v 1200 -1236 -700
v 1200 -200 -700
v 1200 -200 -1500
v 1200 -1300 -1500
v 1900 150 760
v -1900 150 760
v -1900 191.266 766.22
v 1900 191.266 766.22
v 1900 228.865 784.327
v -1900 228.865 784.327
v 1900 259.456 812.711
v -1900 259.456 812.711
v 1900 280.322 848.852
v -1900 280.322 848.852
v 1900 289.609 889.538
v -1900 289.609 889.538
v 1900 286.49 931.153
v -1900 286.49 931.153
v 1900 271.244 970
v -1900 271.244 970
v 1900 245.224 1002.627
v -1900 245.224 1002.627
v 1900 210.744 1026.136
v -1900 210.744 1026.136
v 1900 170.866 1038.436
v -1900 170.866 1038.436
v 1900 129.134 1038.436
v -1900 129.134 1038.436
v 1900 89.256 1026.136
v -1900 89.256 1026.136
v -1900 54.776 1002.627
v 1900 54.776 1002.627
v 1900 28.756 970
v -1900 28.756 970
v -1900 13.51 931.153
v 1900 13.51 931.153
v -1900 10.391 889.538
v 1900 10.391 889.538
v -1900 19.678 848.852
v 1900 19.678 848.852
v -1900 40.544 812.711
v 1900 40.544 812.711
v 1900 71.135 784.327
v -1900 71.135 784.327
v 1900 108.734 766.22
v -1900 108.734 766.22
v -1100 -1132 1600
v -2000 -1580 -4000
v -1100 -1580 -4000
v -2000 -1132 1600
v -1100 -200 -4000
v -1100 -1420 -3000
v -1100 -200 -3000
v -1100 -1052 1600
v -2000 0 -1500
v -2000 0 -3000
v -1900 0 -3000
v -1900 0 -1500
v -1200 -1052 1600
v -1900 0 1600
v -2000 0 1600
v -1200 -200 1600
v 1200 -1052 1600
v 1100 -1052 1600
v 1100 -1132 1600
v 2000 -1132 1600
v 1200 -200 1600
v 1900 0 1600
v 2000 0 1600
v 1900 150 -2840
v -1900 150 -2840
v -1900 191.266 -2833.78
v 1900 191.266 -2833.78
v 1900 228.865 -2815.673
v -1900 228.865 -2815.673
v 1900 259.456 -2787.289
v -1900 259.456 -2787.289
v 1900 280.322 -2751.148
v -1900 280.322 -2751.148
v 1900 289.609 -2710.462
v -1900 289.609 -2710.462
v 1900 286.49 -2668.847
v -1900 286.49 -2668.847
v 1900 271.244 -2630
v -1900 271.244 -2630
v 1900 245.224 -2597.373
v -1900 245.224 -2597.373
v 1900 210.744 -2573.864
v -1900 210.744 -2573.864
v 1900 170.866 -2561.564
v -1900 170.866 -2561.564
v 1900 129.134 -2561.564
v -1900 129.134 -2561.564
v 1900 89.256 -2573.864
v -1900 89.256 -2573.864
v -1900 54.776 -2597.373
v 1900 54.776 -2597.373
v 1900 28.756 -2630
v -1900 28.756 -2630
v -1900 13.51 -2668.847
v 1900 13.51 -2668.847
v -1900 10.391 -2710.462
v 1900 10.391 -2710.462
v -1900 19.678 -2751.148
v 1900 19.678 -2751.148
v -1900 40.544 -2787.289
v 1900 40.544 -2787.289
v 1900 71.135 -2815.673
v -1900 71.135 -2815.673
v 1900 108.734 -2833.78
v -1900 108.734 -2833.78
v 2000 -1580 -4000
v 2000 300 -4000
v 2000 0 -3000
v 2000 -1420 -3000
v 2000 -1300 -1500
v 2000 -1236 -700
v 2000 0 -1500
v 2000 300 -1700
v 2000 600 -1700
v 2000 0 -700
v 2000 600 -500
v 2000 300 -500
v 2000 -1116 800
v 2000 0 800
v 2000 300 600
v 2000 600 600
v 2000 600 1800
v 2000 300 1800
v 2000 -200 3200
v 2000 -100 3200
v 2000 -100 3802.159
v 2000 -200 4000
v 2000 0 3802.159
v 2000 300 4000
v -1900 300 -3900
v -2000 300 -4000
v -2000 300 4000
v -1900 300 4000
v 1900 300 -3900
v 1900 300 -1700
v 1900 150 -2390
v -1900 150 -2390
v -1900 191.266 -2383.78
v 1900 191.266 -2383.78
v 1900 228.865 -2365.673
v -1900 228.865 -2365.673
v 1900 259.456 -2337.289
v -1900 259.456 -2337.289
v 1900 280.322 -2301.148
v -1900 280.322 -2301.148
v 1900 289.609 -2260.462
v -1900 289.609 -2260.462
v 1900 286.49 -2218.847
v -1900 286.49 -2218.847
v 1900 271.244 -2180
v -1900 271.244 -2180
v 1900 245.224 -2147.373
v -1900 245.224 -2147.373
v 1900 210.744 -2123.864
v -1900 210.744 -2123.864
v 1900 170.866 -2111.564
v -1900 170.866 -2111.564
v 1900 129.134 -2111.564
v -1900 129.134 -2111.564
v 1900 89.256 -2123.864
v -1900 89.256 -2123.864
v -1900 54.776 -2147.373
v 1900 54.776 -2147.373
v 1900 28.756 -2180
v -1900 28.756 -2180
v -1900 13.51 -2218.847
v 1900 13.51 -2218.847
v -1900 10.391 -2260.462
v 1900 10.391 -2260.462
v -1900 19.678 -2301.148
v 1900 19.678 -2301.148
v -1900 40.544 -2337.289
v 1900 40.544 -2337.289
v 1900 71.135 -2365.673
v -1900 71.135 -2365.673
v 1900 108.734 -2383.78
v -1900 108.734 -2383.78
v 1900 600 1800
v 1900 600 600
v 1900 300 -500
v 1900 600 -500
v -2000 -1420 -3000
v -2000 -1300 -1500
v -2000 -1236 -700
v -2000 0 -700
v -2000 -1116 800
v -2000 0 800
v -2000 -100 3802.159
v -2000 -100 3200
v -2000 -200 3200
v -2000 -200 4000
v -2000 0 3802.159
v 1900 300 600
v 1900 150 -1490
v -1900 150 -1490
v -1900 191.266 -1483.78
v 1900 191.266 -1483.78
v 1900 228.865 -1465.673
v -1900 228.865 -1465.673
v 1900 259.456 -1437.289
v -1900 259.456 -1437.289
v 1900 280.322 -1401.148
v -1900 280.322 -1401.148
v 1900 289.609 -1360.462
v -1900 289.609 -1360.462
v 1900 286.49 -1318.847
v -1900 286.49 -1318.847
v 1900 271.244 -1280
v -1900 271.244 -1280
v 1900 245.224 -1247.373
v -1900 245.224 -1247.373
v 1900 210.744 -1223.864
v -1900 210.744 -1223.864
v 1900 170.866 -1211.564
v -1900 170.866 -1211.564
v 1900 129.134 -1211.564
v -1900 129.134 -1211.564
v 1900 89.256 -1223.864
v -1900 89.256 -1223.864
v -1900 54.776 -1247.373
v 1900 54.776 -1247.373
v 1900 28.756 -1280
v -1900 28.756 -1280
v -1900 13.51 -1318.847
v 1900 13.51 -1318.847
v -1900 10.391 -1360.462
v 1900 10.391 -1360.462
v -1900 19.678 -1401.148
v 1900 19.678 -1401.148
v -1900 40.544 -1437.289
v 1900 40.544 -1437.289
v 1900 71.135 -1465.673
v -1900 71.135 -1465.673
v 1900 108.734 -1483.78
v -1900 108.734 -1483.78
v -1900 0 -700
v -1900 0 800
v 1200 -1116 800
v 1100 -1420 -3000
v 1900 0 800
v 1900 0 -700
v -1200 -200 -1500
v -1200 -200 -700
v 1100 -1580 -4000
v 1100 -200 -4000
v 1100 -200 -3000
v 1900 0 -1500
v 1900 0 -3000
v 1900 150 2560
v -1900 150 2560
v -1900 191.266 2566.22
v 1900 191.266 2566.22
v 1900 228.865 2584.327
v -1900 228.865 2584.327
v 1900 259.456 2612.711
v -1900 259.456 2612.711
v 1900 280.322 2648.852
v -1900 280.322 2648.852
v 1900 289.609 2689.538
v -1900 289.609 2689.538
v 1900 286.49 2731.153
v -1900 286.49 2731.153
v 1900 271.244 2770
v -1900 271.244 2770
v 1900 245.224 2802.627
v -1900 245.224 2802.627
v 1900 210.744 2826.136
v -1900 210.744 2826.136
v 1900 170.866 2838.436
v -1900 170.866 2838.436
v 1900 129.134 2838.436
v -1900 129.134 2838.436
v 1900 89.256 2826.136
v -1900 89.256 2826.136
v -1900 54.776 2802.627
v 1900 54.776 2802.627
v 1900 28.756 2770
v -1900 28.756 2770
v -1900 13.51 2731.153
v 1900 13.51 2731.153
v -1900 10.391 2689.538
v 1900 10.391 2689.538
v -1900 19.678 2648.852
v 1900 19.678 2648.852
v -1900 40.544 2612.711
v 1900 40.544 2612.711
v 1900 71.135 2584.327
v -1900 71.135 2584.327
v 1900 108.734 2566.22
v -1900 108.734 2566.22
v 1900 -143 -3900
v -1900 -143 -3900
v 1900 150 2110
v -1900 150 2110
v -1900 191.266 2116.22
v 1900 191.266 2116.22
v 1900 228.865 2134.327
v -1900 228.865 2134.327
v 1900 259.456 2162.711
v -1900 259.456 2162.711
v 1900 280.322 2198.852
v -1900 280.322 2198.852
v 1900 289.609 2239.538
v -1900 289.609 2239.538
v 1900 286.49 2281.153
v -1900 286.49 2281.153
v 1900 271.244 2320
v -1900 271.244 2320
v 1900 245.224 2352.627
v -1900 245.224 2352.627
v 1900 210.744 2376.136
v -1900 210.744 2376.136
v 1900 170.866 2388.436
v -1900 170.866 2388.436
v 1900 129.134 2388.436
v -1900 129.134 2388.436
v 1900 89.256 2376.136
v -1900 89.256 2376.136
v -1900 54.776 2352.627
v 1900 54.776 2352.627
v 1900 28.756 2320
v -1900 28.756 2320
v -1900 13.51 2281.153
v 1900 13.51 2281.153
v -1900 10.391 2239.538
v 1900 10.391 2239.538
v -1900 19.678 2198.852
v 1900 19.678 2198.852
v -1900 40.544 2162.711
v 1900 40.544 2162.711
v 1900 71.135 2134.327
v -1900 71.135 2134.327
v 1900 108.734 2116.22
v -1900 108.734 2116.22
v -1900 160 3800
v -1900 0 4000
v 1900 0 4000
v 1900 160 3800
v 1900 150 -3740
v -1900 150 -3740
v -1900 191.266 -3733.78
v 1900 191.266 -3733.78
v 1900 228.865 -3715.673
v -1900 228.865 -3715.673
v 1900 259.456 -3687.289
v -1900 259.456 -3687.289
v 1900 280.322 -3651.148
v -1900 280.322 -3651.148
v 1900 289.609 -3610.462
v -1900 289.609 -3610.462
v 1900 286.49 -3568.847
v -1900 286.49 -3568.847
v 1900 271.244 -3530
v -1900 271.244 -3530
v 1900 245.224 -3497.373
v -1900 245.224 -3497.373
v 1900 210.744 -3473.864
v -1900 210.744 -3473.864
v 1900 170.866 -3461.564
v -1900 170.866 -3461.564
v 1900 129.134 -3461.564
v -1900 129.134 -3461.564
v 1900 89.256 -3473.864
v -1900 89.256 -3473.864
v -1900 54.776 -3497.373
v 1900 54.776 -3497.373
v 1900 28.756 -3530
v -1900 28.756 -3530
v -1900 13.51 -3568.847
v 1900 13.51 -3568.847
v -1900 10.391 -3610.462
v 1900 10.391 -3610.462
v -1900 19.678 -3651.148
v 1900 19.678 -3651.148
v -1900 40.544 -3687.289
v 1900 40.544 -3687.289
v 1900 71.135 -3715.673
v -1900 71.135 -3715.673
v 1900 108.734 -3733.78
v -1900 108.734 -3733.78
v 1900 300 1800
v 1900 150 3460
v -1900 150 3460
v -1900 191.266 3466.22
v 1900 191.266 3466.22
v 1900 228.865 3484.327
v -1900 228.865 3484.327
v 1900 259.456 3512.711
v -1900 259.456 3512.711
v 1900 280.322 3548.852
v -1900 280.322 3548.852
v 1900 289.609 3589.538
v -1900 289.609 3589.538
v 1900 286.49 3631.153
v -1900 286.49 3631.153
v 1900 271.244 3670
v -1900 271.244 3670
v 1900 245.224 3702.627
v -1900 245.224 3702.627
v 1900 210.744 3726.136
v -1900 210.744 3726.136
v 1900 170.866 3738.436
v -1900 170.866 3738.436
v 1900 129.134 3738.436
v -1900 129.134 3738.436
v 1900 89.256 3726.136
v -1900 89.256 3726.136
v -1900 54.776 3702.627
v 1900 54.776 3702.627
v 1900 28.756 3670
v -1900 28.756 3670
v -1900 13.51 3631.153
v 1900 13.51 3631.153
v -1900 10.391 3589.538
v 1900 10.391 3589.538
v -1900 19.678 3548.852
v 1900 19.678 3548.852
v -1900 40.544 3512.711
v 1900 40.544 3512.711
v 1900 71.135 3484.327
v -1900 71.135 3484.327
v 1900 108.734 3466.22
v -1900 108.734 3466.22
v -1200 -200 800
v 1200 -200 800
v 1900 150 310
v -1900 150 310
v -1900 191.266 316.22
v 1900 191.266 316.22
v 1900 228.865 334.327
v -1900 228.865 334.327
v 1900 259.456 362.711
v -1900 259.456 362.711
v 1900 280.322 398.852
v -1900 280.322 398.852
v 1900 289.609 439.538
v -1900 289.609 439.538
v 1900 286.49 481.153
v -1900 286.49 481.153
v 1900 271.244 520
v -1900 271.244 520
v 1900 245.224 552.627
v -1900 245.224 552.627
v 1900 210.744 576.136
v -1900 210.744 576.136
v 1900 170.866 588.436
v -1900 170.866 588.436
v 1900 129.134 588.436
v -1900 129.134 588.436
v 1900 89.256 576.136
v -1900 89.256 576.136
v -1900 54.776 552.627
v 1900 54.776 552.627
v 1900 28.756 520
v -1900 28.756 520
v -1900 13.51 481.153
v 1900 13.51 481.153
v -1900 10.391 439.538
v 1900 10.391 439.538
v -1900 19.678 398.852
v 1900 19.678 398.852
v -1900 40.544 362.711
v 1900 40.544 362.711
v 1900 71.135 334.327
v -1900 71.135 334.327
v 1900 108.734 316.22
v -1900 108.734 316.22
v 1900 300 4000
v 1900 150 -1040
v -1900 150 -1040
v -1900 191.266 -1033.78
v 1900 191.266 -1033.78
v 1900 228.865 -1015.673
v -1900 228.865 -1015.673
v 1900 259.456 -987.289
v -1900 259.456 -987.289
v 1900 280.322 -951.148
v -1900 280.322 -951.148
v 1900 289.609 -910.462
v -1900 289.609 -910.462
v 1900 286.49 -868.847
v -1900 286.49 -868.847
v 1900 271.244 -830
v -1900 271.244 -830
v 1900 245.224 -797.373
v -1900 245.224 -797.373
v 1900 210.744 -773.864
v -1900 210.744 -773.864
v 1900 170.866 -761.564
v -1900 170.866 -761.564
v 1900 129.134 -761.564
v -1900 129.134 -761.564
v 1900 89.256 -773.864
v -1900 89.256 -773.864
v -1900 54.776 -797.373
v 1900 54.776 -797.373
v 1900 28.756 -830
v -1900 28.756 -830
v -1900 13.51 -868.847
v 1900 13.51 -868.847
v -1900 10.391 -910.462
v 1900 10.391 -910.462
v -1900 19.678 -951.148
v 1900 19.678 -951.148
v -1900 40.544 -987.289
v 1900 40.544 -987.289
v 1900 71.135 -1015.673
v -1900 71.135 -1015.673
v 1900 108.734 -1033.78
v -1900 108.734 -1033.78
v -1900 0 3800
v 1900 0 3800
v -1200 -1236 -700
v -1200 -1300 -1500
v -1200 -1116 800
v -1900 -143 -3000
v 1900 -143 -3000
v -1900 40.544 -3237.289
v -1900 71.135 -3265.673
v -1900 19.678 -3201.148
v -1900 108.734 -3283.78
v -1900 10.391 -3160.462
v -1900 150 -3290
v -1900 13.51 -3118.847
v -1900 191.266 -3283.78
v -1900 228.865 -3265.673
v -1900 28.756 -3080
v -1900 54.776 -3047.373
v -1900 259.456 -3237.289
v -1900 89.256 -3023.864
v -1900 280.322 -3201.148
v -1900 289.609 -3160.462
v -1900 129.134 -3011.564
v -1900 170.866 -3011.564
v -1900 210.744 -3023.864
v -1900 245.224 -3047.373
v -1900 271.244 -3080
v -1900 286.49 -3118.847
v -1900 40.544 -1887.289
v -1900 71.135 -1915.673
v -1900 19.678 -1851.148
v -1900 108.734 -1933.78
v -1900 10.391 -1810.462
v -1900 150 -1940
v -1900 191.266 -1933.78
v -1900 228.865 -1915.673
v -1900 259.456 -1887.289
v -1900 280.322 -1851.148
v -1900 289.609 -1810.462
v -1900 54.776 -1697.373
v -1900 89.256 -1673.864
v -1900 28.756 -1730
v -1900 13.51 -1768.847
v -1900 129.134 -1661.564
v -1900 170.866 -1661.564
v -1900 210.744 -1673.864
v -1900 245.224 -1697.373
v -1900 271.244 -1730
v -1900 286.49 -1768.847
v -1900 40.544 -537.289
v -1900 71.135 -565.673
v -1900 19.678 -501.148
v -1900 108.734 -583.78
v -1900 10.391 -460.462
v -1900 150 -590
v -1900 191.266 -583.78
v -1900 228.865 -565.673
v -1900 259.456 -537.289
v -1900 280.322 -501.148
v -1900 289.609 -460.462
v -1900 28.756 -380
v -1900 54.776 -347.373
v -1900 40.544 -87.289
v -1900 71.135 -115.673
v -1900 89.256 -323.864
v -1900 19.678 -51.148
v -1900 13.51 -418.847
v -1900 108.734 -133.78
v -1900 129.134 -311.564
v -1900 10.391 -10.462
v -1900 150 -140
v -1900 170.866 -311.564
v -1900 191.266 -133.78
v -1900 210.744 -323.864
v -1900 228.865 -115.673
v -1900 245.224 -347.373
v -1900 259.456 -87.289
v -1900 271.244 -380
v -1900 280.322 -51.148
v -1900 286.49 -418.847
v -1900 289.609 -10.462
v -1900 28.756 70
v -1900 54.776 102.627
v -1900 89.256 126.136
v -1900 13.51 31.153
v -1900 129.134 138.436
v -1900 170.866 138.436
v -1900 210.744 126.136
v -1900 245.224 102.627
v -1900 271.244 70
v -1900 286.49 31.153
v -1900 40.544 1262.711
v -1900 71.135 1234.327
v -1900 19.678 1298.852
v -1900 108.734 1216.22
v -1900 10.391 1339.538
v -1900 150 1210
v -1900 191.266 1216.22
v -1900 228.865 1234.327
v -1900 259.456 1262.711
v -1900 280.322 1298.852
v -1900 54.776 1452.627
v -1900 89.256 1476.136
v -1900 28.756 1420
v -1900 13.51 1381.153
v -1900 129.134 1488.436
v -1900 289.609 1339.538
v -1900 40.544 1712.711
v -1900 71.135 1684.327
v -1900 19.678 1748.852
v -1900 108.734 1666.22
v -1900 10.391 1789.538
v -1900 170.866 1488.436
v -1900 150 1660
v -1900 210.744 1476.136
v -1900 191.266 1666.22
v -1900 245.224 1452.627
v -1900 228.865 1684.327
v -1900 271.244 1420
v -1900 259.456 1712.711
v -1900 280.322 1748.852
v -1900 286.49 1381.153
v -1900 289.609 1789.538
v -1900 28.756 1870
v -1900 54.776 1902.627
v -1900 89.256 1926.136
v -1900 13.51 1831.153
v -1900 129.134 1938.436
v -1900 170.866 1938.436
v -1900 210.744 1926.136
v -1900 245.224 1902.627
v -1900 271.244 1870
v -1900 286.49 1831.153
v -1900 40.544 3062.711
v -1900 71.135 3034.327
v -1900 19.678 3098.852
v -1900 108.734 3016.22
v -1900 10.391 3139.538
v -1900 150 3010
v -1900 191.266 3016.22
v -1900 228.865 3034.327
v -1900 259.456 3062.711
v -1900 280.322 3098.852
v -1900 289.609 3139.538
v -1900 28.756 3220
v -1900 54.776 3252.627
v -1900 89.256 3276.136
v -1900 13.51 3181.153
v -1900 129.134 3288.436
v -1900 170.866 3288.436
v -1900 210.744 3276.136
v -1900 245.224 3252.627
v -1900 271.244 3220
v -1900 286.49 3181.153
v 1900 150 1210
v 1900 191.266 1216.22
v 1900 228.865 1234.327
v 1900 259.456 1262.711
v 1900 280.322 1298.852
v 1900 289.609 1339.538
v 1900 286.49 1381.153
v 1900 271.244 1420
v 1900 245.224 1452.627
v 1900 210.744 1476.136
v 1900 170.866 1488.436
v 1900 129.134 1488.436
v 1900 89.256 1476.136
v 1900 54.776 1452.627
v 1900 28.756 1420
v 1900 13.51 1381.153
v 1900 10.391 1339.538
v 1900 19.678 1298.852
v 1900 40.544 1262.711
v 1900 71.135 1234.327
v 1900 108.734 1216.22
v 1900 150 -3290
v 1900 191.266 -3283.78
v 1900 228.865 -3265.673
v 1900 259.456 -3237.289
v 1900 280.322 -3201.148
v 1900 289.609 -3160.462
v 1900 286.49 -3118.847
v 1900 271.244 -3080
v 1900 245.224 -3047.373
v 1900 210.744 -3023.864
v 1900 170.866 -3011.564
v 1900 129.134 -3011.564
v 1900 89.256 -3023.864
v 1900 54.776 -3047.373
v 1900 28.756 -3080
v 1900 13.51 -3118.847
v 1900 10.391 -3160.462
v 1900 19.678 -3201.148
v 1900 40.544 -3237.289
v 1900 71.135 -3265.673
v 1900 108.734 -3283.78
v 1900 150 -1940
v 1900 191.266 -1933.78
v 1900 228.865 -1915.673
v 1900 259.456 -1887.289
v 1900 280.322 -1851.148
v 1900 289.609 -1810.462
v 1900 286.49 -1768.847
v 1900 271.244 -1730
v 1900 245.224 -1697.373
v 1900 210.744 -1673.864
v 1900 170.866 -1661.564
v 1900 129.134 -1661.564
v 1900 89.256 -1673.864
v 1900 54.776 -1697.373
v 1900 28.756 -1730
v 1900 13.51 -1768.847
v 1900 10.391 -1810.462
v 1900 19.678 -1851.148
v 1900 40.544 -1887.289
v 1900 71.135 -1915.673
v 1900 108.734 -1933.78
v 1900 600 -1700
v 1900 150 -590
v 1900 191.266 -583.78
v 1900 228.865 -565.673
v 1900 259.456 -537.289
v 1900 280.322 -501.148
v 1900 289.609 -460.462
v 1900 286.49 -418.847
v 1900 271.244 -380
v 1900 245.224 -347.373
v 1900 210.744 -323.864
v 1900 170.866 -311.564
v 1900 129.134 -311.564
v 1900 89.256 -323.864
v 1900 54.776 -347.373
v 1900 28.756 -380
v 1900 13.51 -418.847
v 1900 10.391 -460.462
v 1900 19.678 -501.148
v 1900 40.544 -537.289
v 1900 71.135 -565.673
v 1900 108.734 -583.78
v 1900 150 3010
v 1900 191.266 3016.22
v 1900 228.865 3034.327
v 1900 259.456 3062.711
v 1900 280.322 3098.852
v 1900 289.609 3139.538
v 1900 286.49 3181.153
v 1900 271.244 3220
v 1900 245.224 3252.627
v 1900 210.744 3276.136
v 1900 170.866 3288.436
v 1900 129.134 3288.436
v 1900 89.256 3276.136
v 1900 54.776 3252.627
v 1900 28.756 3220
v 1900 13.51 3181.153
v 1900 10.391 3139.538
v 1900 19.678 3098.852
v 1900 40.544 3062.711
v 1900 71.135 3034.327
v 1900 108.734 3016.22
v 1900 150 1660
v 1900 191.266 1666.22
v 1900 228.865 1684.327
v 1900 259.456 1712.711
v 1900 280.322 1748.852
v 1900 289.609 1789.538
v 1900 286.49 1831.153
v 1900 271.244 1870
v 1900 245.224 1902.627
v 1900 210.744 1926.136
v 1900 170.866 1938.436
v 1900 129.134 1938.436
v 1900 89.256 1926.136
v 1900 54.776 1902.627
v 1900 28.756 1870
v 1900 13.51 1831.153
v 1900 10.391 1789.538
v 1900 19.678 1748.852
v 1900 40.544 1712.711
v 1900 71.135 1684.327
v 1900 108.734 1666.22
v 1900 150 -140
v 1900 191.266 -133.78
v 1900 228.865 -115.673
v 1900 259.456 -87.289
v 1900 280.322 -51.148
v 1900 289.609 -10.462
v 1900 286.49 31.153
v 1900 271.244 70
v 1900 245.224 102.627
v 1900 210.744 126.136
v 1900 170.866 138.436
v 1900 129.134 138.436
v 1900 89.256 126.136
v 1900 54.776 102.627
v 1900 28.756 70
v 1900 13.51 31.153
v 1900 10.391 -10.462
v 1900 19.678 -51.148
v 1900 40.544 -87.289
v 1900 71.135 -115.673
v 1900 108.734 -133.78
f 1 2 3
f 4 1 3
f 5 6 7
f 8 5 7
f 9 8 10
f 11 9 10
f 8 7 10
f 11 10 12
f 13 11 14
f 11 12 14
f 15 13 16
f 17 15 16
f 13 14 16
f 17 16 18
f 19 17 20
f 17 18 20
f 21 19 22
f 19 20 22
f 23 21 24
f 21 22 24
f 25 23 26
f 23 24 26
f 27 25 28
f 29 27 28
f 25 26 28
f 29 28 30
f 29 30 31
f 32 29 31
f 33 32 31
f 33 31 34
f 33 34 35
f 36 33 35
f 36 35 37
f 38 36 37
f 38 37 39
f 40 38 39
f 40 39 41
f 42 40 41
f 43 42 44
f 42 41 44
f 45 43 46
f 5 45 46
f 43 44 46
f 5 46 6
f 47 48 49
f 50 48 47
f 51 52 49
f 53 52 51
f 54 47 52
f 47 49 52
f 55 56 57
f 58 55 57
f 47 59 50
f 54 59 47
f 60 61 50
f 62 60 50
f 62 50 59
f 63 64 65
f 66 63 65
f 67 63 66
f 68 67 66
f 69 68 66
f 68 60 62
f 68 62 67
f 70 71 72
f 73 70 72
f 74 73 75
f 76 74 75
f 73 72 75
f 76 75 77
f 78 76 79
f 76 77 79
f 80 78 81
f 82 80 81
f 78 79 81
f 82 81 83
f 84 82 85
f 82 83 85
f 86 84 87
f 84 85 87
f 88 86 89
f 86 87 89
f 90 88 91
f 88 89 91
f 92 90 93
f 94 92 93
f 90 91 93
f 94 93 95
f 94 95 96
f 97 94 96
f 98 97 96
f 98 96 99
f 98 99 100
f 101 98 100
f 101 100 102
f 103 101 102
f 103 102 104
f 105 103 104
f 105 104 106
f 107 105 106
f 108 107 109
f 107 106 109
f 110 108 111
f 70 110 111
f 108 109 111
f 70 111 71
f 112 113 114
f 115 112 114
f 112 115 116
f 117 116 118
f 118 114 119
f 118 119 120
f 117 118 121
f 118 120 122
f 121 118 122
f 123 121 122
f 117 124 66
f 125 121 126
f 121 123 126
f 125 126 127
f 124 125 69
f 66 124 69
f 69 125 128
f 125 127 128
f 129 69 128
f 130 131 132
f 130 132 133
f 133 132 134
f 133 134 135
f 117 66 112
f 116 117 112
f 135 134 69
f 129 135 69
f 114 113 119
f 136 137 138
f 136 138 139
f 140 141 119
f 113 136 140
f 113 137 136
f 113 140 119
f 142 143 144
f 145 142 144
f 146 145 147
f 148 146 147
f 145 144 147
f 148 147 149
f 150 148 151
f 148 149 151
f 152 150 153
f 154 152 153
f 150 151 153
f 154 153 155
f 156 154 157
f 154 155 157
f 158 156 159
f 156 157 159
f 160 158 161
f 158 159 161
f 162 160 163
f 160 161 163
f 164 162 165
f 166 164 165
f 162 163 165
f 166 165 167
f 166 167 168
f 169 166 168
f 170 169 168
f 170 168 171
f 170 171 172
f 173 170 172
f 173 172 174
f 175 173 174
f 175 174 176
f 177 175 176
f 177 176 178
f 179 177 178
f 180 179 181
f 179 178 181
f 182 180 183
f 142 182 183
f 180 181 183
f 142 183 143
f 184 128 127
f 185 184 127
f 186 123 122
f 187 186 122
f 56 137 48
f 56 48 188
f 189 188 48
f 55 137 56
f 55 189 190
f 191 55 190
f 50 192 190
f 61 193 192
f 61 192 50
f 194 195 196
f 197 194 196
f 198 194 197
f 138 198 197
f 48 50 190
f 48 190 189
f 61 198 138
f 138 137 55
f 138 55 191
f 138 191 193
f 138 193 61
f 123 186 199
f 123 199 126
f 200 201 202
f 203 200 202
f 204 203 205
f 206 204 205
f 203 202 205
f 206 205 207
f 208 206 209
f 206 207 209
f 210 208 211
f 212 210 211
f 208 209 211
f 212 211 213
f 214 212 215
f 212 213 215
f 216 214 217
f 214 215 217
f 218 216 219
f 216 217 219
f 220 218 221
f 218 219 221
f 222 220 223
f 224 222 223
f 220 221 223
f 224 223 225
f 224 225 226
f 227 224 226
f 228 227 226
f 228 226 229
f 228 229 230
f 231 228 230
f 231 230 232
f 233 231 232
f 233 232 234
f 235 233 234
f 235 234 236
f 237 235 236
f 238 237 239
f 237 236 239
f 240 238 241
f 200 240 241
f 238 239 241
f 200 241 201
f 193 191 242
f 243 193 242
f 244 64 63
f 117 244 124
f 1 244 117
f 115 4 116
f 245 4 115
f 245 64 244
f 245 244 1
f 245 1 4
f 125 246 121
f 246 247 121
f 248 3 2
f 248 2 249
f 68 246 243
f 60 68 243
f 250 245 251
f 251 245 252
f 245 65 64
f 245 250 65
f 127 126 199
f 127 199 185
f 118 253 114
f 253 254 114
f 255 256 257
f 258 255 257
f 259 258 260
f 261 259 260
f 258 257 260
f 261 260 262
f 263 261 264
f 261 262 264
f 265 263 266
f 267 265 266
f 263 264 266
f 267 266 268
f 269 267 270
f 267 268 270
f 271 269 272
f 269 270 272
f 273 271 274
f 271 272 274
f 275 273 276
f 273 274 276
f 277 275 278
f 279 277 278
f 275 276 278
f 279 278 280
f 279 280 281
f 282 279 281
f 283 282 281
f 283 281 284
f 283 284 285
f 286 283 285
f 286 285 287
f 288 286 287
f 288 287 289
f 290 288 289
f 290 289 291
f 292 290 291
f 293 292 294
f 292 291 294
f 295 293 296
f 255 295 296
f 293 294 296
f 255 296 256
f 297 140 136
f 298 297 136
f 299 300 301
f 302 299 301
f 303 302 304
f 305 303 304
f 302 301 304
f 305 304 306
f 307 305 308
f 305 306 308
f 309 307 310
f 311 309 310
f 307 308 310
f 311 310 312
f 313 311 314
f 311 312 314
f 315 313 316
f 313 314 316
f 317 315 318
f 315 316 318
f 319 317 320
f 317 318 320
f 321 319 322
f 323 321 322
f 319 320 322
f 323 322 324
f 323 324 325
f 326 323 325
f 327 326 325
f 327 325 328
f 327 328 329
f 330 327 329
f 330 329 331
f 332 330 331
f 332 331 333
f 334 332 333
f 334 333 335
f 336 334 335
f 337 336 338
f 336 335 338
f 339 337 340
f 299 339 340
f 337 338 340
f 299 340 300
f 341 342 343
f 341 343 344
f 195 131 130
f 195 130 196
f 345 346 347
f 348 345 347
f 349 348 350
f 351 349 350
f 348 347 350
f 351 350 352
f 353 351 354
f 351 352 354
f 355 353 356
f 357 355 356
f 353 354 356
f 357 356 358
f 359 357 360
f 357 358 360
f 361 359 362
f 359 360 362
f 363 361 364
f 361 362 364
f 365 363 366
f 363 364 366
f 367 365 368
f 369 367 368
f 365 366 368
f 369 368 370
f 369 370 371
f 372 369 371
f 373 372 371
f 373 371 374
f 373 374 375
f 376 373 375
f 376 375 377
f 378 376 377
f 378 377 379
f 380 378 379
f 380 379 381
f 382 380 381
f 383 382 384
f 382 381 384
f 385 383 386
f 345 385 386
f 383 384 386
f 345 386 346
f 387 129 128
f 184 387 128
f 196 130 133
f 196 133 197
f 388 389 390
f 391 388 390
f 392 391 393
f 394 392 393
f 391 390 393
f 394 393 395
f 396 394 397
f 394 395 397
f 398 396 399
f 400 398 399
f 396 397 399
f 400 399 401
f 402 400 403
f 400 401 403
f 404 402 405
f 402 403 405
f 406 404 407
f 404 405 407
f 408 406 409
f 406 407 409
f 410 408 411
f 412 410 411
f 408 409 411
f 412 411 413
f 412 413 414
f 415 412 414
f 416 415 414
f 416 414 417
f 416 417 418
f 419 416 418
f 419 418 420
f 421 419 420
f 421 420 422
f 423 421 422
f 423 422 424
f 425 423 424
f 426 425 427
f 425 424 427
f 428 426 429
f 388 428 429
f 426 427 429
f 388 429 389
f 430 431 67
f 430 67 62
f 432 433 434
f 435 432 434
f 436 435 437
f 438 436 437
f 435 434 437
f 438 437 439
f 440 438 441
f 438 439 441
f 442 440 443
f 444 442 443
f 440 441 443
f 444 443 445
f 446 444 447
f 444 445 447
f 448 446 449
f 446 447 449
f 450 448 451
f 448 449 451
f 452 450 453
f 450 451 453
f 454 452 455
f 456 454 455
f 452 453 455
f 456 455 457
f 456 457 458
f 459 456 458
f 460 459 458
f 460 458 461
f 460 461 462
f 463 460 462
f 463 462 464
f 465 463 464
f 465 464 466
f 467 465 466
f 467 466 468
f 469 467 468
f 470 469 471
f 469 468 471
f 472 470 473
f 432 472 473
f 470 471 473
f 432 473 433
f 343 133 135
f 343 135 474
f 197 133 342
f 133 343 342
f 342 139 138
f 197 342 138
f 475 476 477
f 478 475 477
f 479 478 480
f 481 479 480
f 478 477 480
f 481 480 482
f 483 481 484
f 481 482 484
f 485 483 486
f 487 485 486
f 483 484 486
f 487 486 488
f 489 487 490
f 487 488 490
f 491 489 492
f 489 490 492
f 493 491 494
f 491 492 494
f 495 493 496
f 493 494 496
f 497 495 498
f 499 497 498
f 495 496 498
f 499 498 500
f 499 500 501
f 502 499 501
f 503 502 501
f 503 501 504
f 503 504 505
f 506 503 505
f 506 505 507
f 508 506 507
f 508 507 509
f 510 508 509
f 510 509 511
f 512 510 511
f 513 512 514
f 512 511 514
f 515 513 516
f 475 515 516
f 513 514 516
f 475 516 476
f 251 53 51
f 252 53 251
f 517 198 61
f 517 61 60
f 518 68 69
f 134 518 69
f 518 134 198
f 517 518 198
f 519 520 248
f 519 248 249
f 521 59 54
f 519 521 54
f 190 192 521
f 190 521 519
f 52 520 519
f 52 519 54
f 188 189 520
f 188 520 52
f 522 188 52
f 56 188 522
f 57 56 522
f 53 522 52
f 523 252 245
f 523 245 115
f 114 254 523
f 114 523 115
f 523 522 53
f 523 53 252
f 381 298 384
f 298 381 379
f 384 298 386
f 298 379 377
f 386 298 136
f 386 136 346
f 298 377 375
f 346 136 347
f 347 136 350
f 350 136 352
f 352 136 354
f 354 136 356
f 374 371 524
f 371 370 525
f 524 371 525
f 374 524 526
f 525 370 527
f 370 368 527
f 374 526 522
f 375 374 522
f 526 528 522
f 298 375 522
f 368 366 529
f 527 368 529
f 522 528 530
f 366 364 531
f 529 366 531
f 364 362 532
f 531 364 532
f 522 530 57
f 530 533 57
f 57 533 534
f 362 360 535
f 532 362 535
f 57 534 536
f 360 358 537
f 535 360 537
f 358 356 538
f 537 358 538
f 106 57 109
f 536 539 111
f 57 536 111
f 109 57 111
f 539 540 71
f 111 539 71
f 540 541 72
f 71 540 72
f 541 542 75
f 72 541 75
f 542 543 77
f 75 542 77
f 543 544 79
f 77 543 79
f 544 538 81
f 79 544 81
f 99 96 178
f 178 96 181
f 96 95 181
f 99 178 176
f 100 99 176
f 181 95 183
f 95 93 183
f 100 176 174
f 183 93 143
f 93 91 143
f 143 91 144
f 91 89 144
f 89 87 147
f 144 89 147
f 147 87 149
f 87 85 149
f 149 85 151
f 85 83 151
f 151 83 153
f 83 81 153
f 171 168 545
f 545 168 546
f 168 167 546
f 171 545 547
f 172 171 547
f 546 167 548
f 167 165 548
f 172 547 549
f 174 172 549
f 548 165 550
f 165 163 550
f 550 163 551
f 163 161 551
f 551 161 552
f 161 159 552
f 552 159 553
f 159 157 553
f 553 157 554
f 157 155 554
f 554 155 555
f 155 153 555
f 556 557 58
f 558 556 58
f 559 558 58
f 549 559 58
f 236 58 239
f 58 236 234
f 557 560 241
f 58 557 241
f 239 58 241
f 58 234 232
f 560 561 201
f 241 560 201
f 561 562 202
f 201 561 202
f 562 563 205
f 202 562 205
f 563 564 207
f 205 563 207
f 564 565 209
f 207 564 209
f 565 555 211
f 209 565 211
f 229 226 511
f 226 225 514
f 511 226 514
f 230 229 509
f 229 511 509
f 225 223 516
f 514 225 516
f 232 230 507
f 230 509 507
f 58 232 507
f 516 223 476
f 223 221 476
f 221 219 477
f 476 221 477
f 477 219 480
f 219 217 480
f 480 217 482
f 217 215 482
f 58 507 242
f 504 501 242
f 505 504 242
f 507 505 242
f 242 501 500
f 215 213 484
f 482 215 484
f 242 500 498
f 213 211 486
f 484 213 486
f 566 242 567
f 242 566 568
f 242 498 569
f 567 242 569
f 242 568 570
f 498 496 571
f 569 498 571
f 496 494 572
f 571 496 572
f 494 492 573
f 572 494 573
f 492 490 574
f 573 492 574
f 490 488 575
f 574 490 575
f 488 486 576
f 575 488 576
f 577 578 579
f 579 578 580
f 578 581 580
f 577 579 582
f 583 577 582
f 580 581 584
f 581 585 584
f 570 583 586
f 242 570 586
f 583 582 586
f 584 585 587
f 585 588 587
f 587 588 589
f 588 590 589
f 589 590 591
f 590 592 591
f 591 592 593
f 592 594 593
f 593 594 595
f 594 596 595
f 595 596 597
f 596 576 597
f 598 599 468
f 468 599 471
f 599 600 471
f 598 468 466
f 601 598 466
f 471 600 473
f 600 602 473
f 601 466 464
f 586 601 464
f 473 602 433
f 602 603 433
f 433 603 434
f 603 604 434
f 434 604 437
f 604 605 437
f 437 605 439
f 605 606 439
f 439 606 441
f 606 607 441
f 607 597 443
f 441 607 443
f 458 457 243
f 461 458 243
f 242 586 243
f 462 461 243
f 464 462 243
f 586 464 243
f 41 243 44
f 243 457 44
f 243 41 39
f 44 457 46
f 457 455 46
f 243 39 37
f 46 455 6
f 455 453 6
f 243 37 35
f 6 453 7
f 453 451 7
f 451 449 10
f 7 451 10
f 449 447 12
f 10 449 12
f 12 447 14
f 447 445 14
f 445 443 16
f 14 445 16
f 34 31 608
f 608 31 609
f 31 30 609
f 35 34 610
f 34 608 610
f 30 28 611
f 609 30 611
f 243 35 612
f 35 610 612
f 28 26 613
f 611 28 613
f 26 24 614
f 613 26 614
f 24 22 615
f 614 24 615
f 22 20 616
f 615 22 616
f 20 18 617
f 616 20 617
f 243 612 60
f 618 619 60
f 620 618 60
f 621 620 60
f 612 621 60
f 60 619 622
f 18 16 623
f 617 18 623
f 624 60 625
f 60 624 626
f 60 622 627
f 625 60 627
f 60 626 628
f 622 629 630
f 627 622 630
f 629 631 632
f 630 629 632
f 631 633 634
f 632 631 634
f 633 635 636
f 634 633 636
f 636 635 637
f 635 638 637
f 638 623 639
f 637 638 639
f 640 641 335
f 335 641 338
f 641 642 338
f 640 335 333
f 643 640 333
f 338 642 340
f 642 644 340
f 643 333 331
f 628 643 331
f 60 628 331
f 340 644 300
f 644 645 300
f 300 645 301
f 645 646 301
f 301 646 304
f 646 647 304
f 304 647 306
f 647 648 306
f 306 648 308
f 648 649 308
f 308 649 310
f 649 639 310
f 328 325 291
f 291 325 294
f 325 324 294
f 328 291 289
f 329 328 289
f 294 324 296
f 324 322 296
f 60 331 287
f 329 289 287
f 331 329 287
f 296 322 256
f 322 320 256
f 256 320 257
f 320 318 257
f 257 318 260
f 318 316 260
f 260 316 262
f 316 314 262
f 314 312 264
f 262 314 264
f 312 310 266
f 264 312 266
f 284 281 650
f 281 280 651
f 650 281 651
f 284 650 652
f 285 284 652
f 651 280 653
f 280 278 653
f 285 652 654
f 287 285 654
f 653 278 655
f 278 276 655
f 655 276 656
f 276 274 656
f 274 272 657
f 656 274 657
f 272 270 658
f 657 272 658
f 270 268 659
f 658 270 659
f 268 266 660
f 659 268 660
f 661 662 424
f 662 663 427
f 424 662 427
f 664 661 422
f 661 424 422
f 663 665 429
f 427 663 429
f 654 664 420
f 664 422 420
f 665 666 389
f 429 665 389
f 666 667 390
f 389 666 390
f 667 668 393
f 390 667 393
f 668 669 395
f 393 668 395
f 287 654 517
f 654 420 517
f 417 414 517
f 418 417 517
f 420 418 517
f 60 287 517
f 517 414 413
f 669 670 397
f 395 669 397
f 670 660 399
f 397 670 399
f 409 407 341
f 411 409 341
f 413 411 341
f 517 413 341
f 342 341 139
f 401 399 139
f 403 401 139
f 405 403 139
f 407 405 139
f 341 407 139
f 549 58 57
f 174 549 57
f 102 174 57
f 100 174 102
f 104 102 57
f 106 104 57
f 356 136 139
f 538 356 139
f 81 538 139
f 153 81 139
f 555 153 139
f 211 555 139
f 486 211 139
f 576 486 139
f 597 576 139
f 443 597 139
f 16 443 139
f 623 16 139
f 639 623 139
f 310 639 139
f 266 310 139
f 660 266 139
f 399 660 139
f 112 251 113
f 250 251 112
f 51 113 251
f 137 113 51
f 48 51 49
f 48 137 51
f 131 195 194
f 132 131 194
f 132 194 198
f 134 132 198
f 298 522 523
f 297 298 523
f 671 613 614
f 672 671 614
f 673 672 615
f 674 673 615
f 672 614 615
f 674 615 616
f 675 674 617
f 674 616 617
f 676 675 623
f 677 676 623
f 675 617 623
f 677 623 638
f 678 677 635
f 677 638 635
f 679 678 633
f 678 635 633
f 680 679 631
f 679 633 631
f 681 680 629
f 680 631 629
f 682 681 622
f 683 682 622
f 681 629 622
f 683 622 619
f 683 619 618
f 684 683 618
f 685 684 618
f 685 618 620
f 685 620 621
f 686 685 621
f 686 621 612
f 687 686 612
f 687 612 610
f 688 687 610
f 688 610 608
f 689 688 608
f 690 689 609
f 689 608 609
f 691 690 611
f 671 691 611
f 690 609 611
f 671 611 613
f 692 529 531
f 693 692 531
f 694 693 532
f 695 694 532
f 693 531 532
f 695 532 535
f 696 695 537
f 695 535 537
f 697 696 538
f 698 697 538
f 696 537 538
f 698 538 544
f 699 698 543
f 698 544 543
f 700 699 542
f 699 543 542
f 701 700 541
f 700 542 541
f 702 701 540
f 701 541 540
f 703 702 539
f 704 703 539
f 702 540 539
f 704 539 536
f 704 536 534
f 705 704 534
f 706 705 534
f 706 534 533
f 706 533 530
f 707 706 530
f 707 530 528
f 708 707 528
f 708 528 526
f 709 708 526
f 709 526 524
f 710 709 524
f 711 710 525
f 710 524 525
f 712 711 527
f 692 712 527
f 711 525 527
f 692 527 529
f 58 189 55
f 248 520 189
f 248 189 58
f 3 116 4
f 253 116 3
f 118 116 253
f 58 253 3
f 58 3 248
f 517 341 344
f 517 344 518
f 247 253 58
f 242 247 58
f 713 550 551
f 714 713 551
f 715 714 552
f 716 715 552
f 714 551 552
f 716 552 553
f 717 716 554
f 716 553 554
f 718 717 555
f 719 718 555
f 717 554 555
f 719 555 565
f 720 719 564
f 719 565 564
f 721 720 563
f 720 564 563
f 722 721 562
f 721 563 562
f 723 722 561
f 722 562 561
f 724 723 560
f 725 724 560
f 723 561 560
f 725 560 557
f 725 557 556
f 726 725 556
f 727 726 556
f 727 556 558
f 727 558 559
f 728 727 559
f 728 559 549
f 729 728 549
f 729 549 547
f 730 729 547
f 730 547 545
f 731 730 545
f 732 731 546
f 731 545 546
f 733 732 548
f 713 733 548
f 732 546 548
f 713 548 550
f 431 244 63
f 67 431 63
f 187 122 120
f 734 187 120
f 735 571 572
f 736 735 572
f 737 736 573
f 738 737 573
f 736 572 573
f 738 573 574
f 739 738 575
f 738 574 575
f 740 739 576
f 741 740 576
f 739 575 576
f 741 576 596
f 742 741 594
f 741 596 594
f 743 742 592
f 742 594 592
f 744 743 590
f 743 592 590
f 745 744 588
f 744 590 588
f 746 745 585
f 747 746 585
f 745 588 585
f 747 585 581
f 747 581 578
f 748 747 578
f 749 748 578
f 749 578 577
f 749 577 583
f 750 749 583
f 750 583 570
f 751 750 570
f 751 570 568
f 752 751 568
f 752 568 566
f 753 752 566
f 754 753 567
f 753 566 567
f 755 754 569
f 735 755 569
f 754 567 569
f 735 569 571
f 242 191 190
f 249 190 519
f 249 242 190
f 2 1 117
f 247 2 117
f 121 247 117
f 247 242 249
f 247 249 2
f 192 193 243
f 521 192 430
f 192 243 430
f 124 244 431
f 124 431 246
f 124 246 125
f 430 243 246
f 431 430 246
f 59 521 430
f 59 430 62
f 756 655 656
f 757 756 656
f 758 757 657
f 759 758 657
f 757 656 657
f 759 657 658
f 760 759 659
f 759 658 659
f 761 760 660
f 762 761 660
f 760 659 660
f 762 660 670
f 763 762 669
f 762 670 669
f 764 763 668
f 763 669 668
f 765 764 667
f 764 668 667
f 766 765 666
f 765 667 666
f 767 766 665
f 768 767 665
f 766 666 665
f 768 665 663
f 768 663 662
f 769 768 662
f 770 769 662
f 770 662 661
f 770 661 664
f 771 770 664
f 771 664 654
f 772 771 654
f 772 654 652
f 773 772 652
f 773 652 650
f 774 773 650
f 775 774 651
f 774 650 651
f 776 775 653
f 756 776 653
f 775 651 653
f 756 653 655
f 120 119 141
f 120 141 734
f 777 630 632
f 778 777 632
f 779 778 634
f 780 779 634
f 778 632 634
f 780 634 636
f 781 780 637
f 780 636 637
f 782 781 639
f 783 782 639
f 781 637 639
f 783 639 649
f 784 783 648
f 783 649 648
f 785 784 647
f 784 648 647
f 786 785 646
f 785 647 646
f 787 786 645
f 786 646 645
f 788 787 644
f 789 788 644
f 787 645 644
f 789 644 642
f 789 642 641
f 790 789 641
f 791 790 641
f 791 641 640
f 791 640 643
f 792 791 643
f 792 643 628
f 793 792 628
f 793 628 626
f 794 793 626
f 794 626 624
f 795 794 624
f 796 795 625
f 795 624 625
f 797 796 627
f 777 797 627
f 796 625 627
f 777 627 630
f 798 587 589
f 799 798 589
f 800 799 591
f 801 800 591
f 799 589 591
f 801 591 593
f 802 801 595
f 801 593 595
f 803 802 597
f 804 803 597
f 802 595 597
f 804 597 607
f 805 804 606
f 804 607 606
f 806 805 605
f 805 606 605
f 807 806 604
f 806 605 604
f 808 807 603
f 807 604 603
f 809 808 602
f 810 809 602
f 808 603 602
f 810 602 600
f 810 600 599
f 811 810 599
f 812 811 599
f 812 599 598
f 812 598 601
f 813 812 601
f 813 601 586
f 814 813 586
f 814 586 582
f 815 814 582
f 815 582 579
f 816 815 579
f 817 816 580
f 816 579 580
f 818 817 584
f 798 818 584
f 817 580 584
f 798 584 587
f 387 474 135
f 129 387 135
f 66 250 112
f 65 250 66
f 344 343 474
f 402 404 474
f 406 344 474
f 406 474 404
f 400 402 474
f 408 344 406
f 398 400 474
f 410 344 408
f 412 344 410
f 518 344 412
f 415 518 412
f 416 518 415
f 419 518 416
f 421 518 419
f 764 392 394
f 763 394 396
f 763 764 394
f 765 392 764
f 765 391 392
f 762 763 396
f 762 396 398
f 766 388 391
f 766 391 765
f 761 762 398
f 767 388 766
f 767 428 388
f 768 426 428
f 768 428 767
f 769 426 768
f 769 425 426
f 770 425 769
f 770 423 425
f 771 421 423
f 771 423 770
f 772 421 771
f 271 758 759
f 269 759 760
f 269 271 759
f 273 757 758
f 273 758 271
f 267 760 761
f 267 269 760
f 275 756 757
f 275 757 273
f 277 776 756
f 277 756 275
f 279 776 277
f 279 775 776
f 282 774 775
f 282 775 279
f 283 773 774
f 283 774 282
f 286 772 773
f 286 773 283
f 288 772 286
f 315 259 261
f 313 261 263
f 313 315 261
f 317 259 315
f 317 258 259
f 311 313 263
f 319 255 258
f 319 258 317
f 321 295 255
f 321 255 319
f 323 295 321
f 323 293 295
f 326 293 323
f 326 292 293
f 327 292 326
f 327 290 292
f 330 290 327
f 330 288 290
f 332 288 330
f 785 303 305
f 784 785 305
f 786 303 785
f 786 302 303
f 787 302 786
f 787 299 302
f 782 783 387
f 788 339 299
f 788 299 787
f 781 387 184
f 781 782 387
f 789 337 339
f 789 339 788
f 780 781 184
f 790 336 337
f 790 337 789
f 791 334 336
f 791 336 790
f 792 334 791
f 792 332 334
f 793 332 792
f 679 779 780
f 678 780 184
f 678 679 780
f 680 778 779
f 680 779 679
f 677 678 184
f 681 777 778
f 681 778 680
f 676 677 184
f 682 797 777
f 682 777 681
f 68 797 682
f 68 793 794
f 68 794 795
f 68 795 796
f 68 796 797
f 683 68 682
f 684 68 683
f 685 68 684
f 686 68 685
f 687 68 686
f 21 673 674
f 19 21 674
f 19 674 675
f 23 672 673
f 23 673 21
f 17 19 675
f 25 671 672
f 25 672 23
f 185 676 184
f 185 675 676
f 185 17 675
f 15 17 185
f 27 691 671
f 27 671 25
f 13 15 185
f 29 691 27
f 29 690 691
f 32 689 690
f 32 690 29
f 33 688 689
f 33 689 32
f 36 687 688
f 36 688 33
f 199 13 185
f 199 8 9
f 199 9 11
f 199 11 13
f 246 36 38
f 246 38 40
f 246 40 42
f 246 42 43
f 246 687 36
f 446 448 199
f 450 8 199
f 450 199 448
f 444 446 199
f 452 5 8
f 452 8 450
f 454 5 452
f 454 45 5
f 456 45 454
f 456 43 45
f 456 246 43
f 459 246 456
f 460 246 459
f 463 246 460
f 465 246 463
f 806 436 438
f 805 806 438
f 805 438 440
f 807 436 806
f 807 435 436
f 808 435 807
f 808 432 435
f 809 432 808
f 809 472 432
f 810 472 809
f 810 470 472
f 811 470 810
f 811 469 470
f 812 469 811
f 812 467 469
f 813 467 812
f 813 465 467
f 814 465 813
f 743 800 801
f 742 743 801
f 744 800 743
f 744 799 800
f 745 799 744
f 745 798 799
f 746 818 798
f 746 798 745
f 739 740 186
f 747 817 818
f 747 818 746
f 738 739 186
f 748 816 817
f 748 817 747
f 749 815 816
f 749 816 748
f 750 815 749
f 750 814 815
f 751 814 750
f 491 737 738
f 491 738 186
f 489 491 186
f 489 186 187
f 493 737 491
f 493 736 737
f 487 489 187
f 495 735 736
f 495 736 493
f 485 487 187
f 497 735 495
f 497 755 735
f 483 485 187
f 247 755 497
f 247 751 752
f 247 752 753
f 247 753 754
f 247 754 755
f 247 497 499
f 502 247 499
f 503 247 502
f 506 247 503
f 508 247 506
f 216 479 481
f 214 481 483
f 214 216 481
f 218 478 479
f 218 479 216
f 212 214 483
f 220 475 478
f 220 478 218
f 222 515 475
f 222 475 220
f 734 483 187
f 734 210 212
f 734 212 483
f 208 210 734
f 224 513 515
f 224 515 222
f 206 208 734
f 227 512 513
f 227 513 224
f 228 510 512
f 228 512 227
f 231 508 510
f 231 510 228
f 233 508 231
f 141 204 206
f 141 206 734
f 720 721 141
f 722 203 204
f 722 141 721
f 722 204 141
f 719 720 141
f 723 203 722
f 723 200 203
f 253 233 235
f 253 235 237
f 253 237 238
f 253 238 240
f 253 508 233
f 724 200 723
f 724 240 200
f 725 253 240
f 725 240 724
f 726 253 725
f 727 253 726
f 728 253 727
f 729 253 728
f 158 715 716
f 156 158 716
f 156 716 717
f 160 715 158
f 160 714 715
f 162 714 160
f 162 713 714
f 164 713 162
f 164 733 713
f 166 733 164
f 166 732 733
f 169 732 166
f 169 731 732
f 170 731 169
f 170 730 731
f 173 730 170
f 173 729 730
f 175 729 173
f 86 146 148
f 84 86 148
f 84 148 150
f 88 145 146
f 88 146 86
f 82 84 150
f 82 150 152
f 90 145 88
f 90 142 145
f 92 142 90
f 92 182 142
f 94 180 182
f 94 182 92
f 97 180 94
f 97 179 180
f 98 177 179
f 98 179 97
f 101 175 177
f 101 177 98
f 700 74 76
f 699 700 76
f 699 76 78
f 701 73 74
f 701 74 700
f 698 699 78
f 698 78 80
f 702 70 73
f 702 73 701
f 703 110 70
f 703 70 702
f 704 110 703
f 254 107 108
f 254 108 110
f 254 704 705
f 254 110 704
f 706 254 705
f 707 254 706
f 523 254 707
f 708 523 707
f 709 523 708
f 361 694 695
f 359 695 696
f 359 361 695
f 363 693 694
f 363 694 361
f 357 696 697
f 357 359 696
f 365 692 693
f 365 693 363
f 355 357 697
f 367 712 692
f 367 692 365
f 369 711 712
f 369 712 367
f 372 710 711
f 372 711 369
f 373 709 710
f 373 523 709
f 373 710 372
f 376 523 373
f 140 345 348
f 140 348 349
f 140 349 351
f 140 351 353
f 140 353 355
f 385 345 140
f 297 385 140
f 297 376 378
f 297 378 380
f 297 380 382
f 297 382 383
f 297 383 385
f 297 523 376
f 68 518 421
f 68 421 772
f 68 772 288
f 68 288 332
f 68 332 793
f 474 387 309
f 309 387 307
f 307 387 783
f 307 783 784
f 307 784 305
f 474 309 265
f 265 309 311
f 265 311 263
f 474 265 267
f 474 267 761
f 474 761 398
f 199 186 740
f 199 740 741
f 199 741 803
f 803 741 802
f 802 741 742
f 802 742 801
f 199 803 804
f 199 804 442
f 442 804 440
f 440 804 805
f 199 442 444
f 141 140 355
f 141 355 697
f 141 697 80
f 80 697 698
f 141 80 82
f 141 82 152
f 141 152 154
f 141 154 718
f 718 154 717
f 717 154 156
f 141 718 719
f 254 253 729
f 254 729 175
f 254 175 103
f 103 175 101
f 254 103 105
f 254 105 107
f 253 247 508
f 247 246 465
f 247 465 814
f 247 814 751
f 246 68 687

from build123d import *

# Parameters (mm, degrees)
SKETCH2_W               = 4000
SKETCH2_H               = 8000
SKETCH2_W_2             = 3800
SKETCH2_H_2             = 7800
BOSS_EXTRUDE1_DEPTH     = 300
SKETCH3_R               = 140
BOSS_EXTRUDE2_DEPTH     = 3800
LPATTERN1_COUNT         = 17
LPATTERN1_PITCH         = 450
BOSS_EXTRUDE3_DEPTH     = 200
SKETCH5_W               = 4000
SKETCH5_H               = 1000
BOSS_EXTRUDE4_DEPTH     = 57
SKETCH6_W               = 4000
SKETCH6_H               = 800
BOSS_EXTRUDE5_DEPTH     = 200
SKETCH7_W               = 4000
SKETCH7_H               = 800
BOSS_EXTRUDE6_DEPTH     = 200
SKETCH8_W               = 4000
SKETCH8_H               = 800
BOSS_EXTRUDE7_DEPTH     = 200
SKETCH9_W               = 3800
SKETCH9_H               = 300
CUT_EXTRUDE1_DEPTH      = 200
BOSS_EXTRUDE8_DEPTH     = 3800
SKETCH11_W              = 1200
SKETCH11_H              = 300
BOSS_EXTRUDE9_DEPTH     = 100
SKETCH12_W              = 900
SKETCH12_H              = 1000
BOSS_EXTRUDE10_DEPTH    = 1300
SKETCH13_W              = 800
SKETCH13_H              = 800
BOSS_EXTRUDE11_DEPTH    = 1100
BOSS_EXTRUDE12_DEPTH    = 800
BOSS_EXTRUDE13_DEPTH    = 900
BOSS_EXTRUDE15_DEPTH    = 4000
CUT_EXTRUDE3_DEPTH      = 4001
BOSS_EXTRUDE16_START    = -2000
BOSS_EXTRUDE16_DEPTH    = 4000
BOSS_EXTRUDE17_REACH    = 1382
SKETCH20_W              = 800
SKETCH20_H              = 800
BOSS_EXTRUDE18_REACH    = 1382
SKETCH28_W              = 800
SKETCH28_H              = 800
SKETCH29_W              = 2200
SKETCH29_H              = 1745.936228959
CUT_EXTRUDE4_DEPTH      = 4001
CUT_EXTRUDE4_DEPTH_BACK = 4000
SKETCH30_W              = 2459.672071775
SKETCH30_H              = 1784.301362594
CUT_EXTRUDE5_DEPTH      = 2000
SKETCH31_W              = 602.15892419
SKETCH31_H              = 100
CUT_EXTRUDE6_DEPTH      = 4000


with BuildPart() as part:
    # Sketch2 → Boss-Extrude1 (new body)
    with BuildSketch(Plane(origin=(0, 0, 0), x_dir=(1, 0, 0), z_dir=(0, 1, 0))):
        Rectangle(SKETCH2_W, SKETCH2_H)
        Rectangle(SKETCH2_W_2, SKETCH2_H_2, mode=Mode.SUBTRACT)
    extrude(amount=BOSS_EXTRUDE1_DEPTH)

    # Sketch3 → Boss-Extrude2 (add)
    with BuildSketch(Plane(origin=(-1900, 0, 0), x_dir=(0, 0, -1), z_dir=(1, 0, 0))):
        with Locations((3600, 150)):
            Circle(SKETCH3_R)
    boss_extrude2 = extrude(amount=BOSS_EXTRUDE2_DEPTH)

    # LPattern1: Boss-Extrude2 ×17
    with Locations(*[(0, 0, i * LPATTERN1_PITCH) for i in range(1, LPATTERN1_COUNT)]):
        add(boss_extrude2)

    # Sketch4 → Boss-Extrude3 (add)
    with BuildSketch(Plane.XZ):
        Polygon((-1900, -3000), (-2000, -3000), (-2000, -4000), (2000, -4000), (2000, -3000), (1900, -3000), (1900, -3900), (-1900, -3900), align=None)
    extrude(amount=BOSS_EXTRUDE3_DEPTH)

    # Sketch5 → Boss-Extrude4 (add)
    with BuildSketch(Plane.XZ.offset(200)):
        with Locations((0, -3500)):
            Rectangle(SKETCH5_W, SKETCH5_H)
    extrude(amount=-BOSS_EXTRUDE4_DEPTH)

    # Sketch6 → Boss-Extrude5 (add)
    with BuildSketch(Plane(origin=(0, 0, 0), x_dir=(-1, 0, 0), z_dir=(0, -1, 0))):
        with Locations((0, -3600)):
            Rectangle(SKETCH6_W, SKETCH6_H)
    extrude(amount=BOSS_EXTRUDE5_DEPTH)

    # Sketch7 → Boss-Extrude6 (add)
    with BuildSketch(Plane(origin=(0, 0, 0), x_dir=(-1, 0, 0), z_dir=(0, -1, 0))):
        with Locations((0, 1100)):
            Rectangle(SKETCH7_W, SKETCH7_H)
    extrude(amount=BOSS_EXTRUDE6_DEPTH)

    # Sketch8 → Boss-Extrude7 (add)
    with BuildSketch(Plane(origin=(0, 0, 0), x_dir=(-1, 0, 0), z_dir=(0, -1, 0))):
        with Locations((0, -1200)):
            Rectangle(SKETCH8_W, SKETCH8_H)
    extrude(amount=BOSS_EXTRUDE7_DEPTH)

    # Sketch9 → Cut-Extrude1 (cut)
    with BuildSketch(Plane(origin=(0, 0, 3900), x_dir=(-1, 0, 0), z_dir=(0, 0, -1))):
        with Locations((0, 150)):
            Rectangle(SKETCH9_W, SKETCH9_H)
    extrude(amount=-CUT_EXTRUDE1_DEPTH, mode=Mode.SUBTRACT)

    # Sketch10 → Boss-Extrude8 (add)
    with BuildSketch(Plane(origin=(-1900, 0, 0), x_dir=(0, 0, -1), z_dir=(1, 0, 0))):
        Polygon((-4000, 0), (-3800, 160), (-3800, 0), align=None)
    extrude(amount=BOSS_EXTRUDE8_DEPTH)

    # Sketch11 → Boss-Extrude9 (add)
    with BuildSketch(Plane(origin=(2000, 0, 0), x_dir=(0, 0, -1), z_dir=(1, 0, 0))):
        with Locations((1100, 450)):
            Rectangle(SKETCH11_W, SKETCH11_H)
        with Locations((-1200, 450)):
            Rectangle(SKETCH11_W, SKETCH11_H)
    extrude(amount=-BOSS_EXTRUDE9_DEPTH)

    # Sketch12 → Boss-Extrude10 (add)
    with BuildSketch(Plane.XZ.offset(200)):
        with Locations((-1550, -3500)):
            Rectangle(SKETCH12_W, SKETCH12_H)
        with Locations((1550, -3500)):
            Rectangle(SKETCH12_W, SKETCH12_H)
    extrude(amount=BOSS_EXTRUDE10_DEPTH)

    # Sketch13 → Boss-Extrude11 (add)
    with BuildSketch(Plane.XZ.offset(200)):
        with Locations((-1600, -1100)):
            Rectangle(SKETCH13_W, SKETCH13_H)
        with Locations((1600, -1100)):
            Rectangle(SKETCH13_W, SKETCH13_H)
    extrude(amount=BOSS_EXTRUDE11_DEPTH)

    # Sketch14 → Boss-Extrude12 (add)
    with BuildSketch(Plane(origin=(2000, 0, 0), x_dir=(0, 0, -1), z_dir=(1, 0, 0))):
        Polygon((700, -1300), (1500, -1380), (1500, -1300), align=None)
    extrude(amount=-BOSS_EXTRUDE12_DEPTH)



with BuildPart() as body_2:
    # Sketch16 → Boss-Extrude13 (new body)
    with BuildSketch(Plane(origin=(2000, 0, 0), x_dir=(0, 0, -1), z_dir=(1, 0, 0))):
        Polygon((3000, -1500), (4000, -1580), (4000, -1500), align=None)
    extrude(amount=-BOSS_EXTRUDE13_DEPTH)


with BuildPart() as part_1:
    add(part.part)

    add(body_2.part)  # Boss-Extrude15 merges body 2
    # Sketch21 → Boss-Extrude15 (add)
    with BuildSketch(Plane.ZY.offset(2000)):
        Polygon((-4000, -1500), (-4000, -1580), (-3000, -1500), align=None)
    extrude(amount=-BOSS_EXTRUDE15_DEPTH)

    # Sketch24 → Cut-Extrude3 (cut, through all)
    with BuildSketch(Plane(origin=(2000, 0, 0), x_dir=(0, 0, -1), z_dir=(1, 0, 0))):
        Polygon((700, -1300), (1500, -1300), (1500, -1380), align=None)
    extrude(amount=-CUT_EXTRUDE3_DEPTH, mode=Mode.SUBTRACT)

    # Sketch27 → Boss-Extrude16 (add)
    with BuildSketch(Plane(origin=(0, 0, 0), x_dir=(0, 0, -1), z_dir=(1, 0, 0)).offset(BOSS_EXTRUDE16_START)):
        Polygon((4000, -1580), (-4000, -940), (-4000, -860), (4000, -1500), align=None)
    extrude(amount=BOSS_EXTRUDE16_DEPTH)

    # Boss-Extrude17: up to this face of the body (flat: up to its plane)
    boss_extrude17_end = Plane(part_1.part.faces().sort_by_distance((0, -1158.677731674, 266.52835408))[0])
    # Sketch20 → Boss-Extrude17 (add, up to the picked face)
    with BuildSketch(Plane.XZ.offset(200), mode=Mode.PRIVATE) as boss_extrude17_sk1:
        with Locations((-1600, 1200)):
            Rectangle(SKETCH20_W, SKETCH20_H)
    boss_extrude17_tool1 = split(extrude(boss_extrude17_sk1.sketch, amount=BOSS_EXTRUDE17_REACH, mode=Mode.PRIVATE), bisect_by=boss_extrude17_end, keep=Keep.BOTH, mode=Mode.PRIVATE)
    add(boss_extrude17_tool1.solids().sort_by_distance((-1600, -200, 1200))[0])

    # Boss-Extrude18: up to this face of the body (flat: up to its plane)
    boss_extrude18_end = Plane(part_1.part.faces().sort_by_distance((36.209335219, -1160.367751061, 245.40311174))[0])
    # Sketch28 → Boss-Extrude18 (add, up to the picked face)
    with BuildSketch(Plane.XZ.offset(200), mode=Mode.PRIVATE) as boss_extrude18_sk1:
        with Locations((1600, 1200)):
            Rectangle(SKETCH28_W, SKETCH28_H)
    boss_extrude18_tool1 = split(extrude(boss_extrude18_sk1.sketch, amount=BOSS_EXTRUDE18_REACH, mode=Mode.PRIVATE), bisect_by=boss_extrude18_end, keep=Keep.BOTH, mode=Mode.PRIVATE)
    add(boss_extrude18_tool1.solids().sort_by_distance((1600, -200, 1200))[0])

    # Sketch29 → Cut-Extrude4 (cut, two sides)
    with BuildSketch(Plane.XY) as cut_extrude4_sk:
        with Locations((0, -1252.772345586)):
            Rectangle(SKETCH29_W, SKETCH29_H)
    extrude(amount=CUT_EXTRUDE4_DEPTH, mode=Mode.SUBTRACT)
    extrude(cut_extrude4_sk.sketch, amount=-CUT_EXTRUDE4_DEPTH_BACK, mode=Mode.SUBTRACT)

    # Sketch30 → Cut-Extrude5 (cut, symmetric)
    with BuildSketch(Plane(origin=(0, 0, 0), x_dir=(0, 0, -1), z_dir=(1, 0, 0))):
        with Locations((-2829.836035888, -1280.25847445)):
            Rectangle(SKETCH30_W, SKETCH30_H)
    extrude(amount=CUT_EXTRUDE5_DEPTH, both=True, mode=Mode.SUBTRACT)

    # Sketch31 → Cut-Extrude6 (cut)
    with BuildSketch(Plane.ZY.offset(2000)):
        with Locations((3501.079462095, -50)):
            Rectangle(SKETCH31_W, SKETCH31_H)
    extrude(amount=-CUT_EXTRUDE6_DEPTH, mode=Mode.SUBTRACT)


solid = part_1.part
